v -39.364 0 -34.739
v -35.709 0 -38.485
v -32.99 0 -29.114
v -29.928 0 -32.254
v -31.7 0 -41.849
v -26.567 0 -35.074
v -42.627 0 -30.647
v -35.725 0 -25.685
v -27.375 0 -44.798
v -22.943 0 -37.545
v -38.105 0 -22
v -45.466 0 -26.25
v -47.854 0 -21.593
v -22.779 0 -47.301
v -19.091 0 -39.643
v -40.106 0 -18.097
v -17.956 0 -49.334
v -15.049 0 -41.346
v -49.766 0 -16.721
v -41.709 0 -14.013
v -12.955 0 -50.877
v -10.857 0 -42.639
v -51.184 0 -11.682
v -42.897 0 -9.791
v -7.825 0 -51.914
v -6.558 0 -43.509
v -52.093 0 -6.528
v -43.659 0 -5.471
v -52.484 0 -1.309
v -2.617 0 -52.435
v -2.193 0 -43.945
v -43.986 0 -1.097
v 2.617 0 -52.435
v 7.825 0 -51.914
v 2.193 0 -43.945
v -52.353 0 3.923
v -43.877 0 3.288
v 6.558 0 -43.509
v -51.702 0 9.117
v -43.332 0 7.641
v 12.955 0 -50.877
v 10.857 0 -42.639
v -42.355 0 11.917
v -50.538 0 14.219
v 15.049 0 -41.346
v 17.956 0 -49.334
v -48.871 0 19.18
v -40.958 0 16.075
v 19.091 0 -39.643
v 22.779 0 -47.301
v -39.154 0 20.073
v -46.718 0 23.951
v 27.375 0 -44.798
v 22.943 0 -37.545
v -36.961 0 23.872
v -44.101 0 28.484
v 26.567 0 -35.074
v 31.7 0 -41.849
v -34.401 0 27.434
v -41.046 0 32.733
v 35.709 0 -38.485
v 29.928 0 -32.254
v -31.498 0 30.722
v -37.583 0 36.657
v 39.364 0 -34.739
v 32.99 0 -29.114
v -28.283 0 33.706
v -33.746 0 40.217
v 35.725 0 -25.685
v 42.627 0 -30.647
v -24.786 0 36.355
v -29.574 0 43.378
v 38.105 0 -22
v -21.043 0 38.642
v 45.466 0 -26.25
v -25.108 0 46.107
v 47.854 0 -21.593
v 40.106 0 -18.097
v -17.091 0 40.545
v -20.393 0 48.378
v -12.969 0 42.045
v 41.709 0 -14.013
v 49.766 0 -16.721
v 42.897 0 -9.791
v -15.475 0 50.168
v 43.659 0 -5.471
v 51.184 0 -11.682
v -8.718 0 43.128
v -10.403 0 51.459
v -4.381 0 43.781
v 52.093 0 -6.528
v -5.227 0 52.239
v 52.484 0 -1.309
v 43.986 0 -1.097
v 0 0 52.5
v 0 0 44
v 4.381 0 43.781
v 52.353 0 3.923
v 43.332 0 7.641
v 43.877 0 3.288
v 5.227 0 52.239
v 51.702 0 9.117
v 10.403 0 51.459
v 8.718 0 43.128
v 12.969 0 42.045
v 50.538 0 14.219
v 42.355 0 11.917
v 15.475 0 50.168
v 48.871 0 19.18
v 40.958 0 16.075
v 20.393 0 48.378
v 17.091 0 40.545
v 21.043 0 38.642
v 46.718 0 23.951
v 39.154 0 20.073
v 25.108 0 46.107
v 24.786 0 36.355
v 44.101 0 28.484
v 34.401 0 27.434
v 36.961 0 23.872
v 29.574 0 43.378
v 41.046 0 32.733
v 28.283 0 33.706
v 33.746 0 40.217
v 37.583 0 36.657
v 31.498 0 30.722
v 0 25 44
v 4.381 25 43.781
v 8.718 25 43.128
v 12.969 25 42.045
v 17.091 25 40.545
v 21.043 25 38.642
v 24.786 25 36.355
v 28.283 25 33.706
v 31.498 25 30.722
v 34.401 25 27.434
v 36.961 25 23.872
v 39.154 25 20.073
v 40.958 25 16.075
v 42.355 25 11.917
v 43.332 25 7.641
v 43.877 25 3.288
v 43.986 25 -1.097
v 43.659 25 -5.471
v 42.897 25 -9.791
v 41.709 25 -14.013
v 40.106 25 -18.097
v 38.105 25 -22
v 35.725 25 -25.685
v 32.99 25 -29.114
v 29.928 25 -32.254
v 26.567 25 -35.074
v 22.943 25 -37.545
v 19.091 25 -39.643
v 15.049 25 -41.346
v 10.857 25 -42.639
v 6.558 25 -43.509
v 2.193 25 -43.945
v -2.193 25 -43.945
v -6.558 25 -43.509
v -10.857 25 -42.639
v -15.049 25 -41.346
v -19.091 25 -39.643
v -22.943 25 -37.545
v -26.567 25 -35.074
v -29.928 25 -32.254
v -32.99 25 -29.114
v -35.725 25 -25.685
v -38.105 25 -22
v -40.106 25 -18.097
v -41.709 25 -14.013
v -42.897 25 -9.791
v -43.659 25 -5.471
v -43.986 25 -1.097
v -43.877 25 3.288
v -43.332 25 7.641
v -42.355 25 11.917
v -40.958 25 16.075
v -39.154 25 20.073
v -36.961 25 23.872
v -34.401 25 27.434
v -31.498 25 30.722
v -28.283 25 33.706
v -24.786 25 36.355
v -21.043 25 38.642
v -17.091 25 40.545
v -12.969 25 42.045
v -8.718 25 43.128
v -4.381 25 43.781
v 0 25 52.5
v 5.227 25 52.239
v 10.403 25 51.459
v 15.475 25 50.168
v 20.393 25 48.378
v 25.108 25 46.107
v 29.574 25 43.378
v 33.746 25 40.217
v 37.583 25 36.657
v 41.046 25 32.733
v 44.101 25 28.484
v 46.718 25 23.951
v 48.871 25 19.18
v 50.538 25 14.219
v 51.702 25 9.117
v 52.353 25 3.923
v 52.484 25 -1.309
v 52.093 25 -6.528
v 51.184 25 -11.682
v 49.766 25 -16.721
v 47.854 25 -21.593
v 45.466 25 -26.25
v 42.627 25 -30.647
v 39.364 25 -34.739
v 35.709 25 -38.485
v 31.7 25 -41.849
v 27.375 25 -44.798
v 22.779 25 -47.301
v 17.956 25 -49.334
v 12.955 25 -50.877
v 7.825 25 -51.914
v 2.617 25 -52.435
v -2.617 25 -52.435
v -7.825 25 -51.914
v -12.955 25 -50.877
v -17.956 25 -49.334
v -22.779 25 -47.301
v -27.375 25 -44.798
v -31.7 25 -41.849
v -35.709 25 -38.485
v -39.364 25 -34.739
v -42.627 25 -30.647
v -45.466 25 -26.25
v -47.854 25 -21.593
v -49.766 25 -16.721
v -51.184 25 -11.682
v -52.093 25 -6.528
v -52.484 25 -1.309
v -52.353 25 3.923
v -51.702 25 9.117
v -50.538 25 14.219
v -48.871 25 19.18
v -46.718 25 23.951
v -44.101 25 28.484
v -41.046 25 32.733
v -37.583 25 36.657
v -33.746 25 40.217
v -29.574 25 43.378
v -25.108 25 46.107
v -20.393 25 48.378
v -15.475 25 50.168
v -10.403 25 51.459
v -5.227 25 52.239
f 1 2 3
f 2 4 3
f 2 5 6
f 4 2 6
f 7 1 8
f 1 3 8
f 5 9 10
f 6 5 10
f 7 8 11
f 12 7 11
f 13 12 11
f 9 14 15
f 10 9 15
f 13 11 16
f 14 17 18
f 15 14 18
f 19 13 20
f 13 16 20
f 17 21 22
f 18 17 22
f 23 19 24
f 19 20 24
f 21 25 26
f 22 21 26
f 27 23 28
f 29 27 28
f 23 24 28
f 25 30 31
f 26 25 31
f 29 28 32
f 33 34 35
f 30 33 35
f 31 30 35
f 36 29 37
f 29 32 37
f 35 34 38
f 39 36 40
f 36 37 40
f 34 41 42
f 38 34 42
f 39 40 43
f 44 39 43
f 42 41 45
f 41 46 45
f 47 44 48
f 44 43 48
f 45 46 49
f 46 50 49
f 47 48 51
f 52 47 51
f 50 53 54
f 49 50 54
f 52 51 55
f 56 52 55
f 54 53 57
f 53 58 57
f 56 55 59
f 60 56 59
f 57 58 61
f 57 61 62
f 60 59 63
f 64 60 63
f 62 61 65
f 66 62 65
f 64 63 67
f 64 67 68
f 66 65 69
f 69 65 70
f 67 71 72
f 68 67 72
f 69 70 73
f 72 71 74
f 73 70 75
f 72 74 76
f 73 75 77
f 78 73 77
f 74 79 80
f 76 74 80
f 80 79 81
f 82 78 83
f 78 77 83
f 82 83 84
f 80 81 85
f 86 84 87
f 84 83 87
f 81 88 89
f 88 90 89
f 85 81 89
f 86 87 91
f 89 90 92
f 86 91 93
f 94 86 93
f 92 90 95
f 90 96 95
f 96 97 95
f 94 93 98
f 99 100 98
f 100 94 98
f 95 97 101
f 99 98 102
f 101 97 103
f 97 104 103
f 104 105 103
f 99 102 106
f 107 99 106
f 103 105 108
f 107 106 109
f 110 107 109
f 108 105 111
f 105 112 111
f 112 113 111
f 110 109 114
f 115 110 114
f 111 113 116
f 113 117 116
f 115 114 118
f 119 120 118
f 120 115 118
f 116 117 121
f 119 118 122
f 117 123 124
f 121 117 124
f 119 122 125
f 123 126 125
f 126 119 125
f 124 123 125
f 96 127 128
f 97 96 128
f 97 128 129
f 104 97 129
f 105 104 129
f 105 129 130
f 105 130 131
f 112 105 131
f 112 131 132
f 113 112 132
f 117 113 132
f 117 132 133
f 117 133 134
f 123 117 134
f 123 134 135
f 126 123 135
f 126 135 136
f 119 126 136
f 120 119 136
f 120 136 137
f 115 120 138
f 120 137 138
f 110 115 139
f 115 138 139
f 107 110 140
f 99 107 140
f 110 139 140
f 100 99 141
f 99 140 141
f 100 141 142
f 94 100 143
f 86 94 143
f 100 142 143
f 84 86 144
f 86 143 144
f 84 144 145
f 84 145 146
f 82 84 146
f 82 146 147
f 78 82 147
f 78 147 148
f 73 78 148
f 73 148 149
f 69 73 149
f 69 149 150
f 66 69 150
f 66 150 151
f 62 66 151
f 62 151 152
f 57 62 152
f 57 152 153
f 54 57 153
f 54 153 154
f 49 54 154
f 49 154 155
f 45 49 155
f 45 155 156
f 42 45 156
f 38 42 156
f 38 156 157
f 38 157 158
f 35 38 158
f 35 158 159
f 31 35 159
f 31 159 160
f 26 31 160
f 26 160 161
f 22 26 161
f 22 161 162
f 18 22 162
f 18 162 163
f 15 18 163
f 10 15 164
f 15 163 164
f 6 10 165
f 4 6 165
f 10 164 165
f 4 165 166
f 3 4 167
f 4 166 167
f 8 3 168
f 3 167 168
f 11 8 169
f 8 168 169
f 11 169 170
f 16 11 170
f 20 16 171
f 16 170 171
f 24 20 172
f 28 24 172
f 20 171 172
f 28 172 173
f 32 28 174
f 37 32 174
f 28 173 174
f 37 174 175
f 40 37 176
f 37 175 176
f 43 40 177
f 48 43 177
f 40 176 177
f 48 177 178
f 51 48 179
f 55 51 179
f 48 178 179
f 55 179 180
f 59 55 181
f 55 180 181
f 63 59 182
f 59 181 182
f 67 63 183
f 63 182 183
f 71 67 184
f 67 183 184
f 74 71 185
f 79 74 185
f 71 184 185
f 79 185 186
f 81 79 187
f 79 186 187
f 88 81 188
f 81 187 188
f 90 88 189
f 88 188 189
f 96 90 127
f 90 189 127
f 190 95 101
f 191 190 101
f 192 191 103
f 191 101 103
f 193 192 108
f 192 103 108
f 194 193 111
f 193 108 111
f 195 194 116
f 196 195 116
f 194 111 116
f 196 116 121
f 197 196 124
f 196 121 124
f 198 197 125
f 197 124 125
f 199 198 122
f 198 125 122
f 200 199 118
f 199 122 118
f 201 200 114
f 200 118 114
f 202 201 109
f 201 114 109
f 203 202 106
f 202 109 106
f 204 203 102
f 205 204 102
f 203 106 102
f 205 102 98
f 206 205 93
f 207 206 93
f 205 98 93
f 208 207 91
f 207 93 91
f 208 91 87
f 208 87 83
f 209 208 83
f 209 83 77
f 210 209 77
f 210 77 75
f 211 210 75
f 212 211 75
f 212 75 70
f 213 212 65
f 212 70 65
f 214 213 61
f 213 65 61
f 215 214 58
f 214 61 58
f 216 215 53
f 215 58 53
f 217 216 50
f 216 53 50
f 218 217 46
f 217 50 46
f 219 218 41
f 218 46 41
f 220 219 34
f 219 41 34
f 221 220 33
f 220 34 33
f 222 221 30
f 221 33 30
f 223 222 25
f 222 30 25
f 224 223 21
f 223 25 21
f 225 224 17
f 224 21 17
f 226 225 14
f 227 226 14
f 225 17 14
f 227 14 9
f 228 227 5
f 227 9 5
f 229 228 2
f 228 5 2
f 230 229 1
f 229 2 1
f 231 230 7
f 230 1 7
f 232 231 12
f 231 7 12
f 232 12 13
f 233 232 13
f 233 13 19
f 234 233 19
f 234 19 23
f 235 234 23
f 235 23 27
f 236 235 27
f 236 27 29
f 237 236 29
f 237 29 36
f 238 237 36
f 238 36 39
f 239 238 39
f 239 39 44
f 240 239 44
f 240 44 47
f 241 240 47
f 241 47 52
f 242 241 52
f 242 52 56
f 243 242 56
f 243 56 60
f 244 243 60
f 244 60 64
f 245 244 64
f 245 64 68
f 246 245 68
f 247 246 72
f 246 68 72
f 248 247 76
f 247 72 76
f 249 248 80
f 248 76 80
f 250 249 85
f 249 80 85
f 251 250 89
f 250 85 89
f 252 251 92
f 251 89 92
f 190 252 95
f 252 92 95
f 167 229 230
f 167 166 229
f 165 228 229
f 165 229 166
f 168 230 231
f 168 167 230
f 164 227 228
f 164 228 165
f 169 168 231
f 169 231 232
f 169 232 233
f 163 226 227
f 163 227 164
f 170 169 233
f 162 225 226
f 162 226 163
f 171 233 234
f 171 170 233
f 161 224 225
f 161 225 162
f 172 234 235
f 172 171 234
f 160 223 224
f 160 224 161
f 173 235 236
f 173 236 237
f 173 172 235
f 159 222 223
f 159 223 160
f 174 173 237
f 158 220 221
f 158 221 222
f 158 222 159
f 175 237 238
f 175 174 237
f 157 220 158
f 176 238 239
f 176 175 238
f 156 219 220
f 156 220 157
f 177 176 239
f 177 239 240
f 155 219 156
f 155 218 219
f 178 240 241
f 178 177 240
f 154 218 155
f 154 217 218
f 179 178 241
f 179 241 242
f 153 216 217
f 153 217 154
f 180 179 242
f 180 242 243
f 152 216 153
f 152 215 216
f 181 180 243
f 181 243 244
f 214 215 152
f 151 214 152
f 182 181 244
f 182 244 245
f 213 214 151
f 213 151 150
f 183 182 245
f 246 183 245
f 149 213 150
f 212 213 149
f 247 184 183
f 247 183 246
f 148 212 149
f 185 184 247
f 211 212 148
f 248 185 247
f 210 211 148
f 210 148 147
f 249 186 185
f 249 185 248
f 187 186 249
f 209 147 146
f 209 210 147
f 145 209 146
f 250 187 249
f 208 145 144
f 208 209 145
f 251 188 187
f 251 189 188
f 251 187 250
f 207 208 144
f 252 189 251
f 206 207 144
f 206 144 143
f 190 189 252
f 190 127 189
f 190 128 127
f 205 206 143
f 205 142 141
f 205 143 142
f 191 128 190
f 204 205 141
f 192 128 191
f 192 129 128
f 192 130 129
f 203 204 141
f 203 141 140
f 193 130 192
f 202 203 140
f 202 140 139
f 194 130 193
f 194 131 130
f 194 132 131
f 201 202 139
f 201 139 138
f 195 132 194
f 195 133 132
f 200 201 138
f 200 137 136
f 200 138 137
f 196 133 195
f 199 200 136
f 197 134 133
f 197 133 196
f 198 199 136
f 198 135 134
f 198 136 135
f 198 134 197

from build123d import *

# Parameters (mm, degrees)
SKETCH_1_R               = 52.5
SKETCH_1_R_2             = 11.15
EXTRUDE_1_DEPTH          = 25
CUT_EXTRUDE_1_DEPTH      = 30
PATTERN_CIRCULAR_1_COUNT = 6
FILLET_1_R               = 5
SKETCH_3_R               = 44
CUT_EXTRUDE_2_DEPTH      = 30


with BuildPart() as part:
    # 草图1 → 凸台-拉伸1 (new body)
    with BuildSketch(Plane(origin=(0, 0, 0), x_dir=(1, 0, 0), z_dir=(0, 1, 0))):
        with Locations(Location((0, 0, 0), (0, 0, 270))):
            Circle(SKETCH_1_R)
        with Locations(Location((0, 0, 0), (0, 0, 270))):
            Circle(SKETCH_1_R_2, mode=Mode.SUBTRACT)
    extrude(amount=EXTRUDE_1_DEPTH)

    # 草图2 → 切除-拉伸1 (cut)
    with BuildSketch(Plane(origin=(0, 25, 0), x_dir=(1, 0, 0), z_dir=(0, 1, 0))):
        with BuildLine():
            ThreePointArc((-21.398006208, 27.062433932), (-29.877876431, 17.25), (-34.135758377, 5))
            Line((-34.135758377, 5), (-21.15, 5))
            Line((-21.15, 5), (-20.550486612, 5))
            ThreePointArc((-20.550486612, 5), (-18.31643729, 10.575), (-14.605370325, 15.297243466))
            Line((-14.605370325, 15.297243466), (-14.905127019, 15.81643729))
            Line((-14.905127019, 15.81643729), (-21.398006208, 27.062433932))
        make_face()
    cut_extrude_1 = extrude(amount=-CUT_EXTRUDE_1_DEPTH, mode=Mode.SUBTRACT)

    # 阵列(圆周)1: 切除-拉伸1 ×6 about axis
    pattern_circular_1_axis = Axis((0, 25, 0), (0, -1, 0))
    for i in range(1, PATTERN_CIRCULAR_1_COUNT):
        add(cut_extrude_1.rotate(pattern_circular_1_axis, i * 360 / PATTERN_CIRCULAR_1_COUNT), mode=Mode.SUBTRACT)

    # 圆角1
    fillet_1_edges = [part.edges().sort_by_distance(p)[0] for p in [
        (-21.398006208, 12.5, -27.062433932),
        (-14.605370325, 12.5, -15.297243466),
        (-20.550486612, 12.5, -5),
        (-34.135758377, 12.5, -5),
        (-34.135758377, 12.5, 5),
        (-20.550486612, 12.5, 5),
        (-14.605370325, 12.5, 15.297243466),
        (-21.398006208, 12.5, 27.062433932),
        (-12.73775217, 12.5, 32.062433932),
        (-5.945116287, 12.5, 20.297243466),
        (5.945116287, 12.5, 20.297243466),
        (12.73775217, 12.5, 32.062433932),
        (21.398006208, 12.5, 27.062433932),
        (14.605370325, 12.5, 15.297243466),
        (20.550486612, 12.5, 5),
        (34.135758377, 12.5, 5),
        (34.135758377, 12.5, -5),
        (20.550486612, 12.5, -5),
        (14.605370325, 12.5, -15.297243466),
        (21.398006208, 12.5, -27.062433932),
        (12.73775217, 12.5, -32.062433932),
        (5.945116287, 12.5, -20.297243466),
        (-5.945116287, 12.5, -20.297243466),
        (-12.73775217, 12.5, -32.062433932),
    ]]
    fillet(fillet_1_edges, radius=FILLET_1_R)

    # 草图3 → 切除-拉伸2 (cut)
    with BuildSketch(Plane(origin=(0, 25, 0), x_dir=(1, 0, 0), z_dir=(0, 1, 0))):
        with Locations(Location((0, 0, 0), (0, 0, 270))):
            Circle(SKETCH_3_R)
        with BuildLine():
            ThreePointArc((9.546562067, -26.535130538), (9.751380834, -31.140900403), (6.100576582, -33.956339104))
            ThreePointArc((6.100576582, -33.956339104), (0, -34.5), (-6.100576582, -33.956339104))
            ThreePointArc((-6.100576582, -33.956339104), (-9.751380834, -31.140900403), (-9.546562067, -26.535130538))
            Line((-9.546562067, -26.535130538), (-7.751082565, -23.425268815))
            ThreePointArc((-7.751082565, -23.425268815), (-5.631733419, -21.440576943), (-2.766853147, -20.968238449))
            ThreePointArc((-2.766853147, -20.968238449), (0, -21.15), (2.766853147, -20.968238449))
            ThreePointArc((2.766853147, -20.968238449), (5.631733419, -21.440576943), (7.751082565, -23.425268815))
            Line((7.751082565, -23.425268815), (9.546562067, -26.535130538))
        make_face(mode=Mode.SUBTRACT)
        with BuildLine():
            ThreePointArc((27.753378173, -5), (31.844501263, -7.125506677), (32.457340575, -11.694915254))
            ThreePointArc((32.457340575, -11.694915254), (29.877876431, -17.25), (26.356763993, -22.26142385))
            ThreePointArc((26.356763993, -22.26142385), (22.093120428, -24.015393726), (18.206816105, -21.535130538))
            Line((18.206816105, -21.535130538), (16.411336602, -18.425268815))
            ThreePointArc((16.411336602, -18.425268815), (15.752217595, -15.59751268), (16.775600596, -12.880284338))
            ThreePointArc((16.775600596, -12.880284338), (18.31643729, -10.575), (19.542453743, -8.087954111))
            ThreePointArc((19.542453743, -8.087954111), (21.383951014, -5.843064263), (24.162419167, -5))
            Line((24.162419167, -5), (27.753378173, -5))
        make_face(mode=Mode.SUBTRACT)
        with BuildLine():
            ThreePointArc((-27.753378173, 5), (-31.844501263, 7.125506677), (-32.457340575, 11.694915254))
            ThreePointArc((-32.457340575, 11.694915254), (-29.877876431, 17.25), (-26.356763993, 22.26142385))
            ThreePointArc((-26.356763993, 22.26142385), (-22.093120428, 24.015393726), (-18.206816105, 21.535130538))
            Line((-18.206816105, 21.535130538), (-16.411336602, 18.425268815))
            ThreePointArc((-16.411336602, 18.425268815), (-15.752217595, 15.59751268), (-16.775600596, 12.880284338))
            ThreePointArc((-16.775600596, 12.880284338), (-18.31643729, 10.575), (-19.542453743, 8.087954111))
            ThreePointArc((-19.542453743, 8.087954111), (-21.383951014, 5.843064263), (-24.162419167, 5))
            Line((-24.162419167, 5), (-27.753378173, 5))
        make_face(mode=Mode.SUBTRACT)
        with BuildLine():
            ThreePointArc((-9.546562067, 26.535130538), (-9.751380834, 31.140900403), (-6.100576582, 33.956339104))
            ThreePointArc((-6.100576582, 33.956339104), (0, 34.5), (6.100576582, 33.956339104))
            ThreePointArc((6.100576582, 33.956339104), (9.751380834, 31.140900403), (9.546562067, 26.535130538))
            Line((9.546562067, 26.535130538), (7.751082565, 23.425268815))
            ThreePointArc((7.751082565, 23.425268815), (5.631733419, 21.440576943), (2.766853147, 20.968238449))
            ThreePointArc((2.766853147, 20.968238449), (0, 21.15), (-2.766853147, 20.968238449))
            ThreePointArc((-2.766853147, 20.968238449), (-5.631733419, 21.440576943), (-7.751082565, 23.425268815))
            Line((-7.751082565, 23.425268815), (-9.546562067, 26.535130538))
        make_face(mode=Mode.SUBTRACT)
        with BuildLine():
            ThreePointArc((18.206816105, 21.535130538), (22.093120428, 24.015393726), (26.356763993, 22.26142385))
            ThreePointArc((26.356763993, 22.26142385), (29.877876431, 17.25), (32.457340575, 11.694915254))
            ThreePointArc((32.457340575, 11.694915254), (31.844501263, 7.125506677), (27.753378173, 5))
            Line((27.753378173, 5), (24.162419167, 5))
            ThreePointArc((24.162419167, 5), (21.383951014, 5.843064263), (19.542453743, 8.087954111))
            ThreePointArc((19.542453743, 8.087954111), (18.31643729, 10.575), (16.775600596, 12.880284338))
            ThreePointArc((16.775600596, 12.880284338), (15.752217595, 15.59751268), (16.411336602, 18.425268815))
            Line((16.411336602, 18.425268815), (18.206816105, 21.535130538))
        make_face(mode=Mode.SUBTRACT)
    extrude(amount=-CUT_EXTRUDE_2_DEPTH, mode=Mode.SUBTRACT)


solid = part.part
